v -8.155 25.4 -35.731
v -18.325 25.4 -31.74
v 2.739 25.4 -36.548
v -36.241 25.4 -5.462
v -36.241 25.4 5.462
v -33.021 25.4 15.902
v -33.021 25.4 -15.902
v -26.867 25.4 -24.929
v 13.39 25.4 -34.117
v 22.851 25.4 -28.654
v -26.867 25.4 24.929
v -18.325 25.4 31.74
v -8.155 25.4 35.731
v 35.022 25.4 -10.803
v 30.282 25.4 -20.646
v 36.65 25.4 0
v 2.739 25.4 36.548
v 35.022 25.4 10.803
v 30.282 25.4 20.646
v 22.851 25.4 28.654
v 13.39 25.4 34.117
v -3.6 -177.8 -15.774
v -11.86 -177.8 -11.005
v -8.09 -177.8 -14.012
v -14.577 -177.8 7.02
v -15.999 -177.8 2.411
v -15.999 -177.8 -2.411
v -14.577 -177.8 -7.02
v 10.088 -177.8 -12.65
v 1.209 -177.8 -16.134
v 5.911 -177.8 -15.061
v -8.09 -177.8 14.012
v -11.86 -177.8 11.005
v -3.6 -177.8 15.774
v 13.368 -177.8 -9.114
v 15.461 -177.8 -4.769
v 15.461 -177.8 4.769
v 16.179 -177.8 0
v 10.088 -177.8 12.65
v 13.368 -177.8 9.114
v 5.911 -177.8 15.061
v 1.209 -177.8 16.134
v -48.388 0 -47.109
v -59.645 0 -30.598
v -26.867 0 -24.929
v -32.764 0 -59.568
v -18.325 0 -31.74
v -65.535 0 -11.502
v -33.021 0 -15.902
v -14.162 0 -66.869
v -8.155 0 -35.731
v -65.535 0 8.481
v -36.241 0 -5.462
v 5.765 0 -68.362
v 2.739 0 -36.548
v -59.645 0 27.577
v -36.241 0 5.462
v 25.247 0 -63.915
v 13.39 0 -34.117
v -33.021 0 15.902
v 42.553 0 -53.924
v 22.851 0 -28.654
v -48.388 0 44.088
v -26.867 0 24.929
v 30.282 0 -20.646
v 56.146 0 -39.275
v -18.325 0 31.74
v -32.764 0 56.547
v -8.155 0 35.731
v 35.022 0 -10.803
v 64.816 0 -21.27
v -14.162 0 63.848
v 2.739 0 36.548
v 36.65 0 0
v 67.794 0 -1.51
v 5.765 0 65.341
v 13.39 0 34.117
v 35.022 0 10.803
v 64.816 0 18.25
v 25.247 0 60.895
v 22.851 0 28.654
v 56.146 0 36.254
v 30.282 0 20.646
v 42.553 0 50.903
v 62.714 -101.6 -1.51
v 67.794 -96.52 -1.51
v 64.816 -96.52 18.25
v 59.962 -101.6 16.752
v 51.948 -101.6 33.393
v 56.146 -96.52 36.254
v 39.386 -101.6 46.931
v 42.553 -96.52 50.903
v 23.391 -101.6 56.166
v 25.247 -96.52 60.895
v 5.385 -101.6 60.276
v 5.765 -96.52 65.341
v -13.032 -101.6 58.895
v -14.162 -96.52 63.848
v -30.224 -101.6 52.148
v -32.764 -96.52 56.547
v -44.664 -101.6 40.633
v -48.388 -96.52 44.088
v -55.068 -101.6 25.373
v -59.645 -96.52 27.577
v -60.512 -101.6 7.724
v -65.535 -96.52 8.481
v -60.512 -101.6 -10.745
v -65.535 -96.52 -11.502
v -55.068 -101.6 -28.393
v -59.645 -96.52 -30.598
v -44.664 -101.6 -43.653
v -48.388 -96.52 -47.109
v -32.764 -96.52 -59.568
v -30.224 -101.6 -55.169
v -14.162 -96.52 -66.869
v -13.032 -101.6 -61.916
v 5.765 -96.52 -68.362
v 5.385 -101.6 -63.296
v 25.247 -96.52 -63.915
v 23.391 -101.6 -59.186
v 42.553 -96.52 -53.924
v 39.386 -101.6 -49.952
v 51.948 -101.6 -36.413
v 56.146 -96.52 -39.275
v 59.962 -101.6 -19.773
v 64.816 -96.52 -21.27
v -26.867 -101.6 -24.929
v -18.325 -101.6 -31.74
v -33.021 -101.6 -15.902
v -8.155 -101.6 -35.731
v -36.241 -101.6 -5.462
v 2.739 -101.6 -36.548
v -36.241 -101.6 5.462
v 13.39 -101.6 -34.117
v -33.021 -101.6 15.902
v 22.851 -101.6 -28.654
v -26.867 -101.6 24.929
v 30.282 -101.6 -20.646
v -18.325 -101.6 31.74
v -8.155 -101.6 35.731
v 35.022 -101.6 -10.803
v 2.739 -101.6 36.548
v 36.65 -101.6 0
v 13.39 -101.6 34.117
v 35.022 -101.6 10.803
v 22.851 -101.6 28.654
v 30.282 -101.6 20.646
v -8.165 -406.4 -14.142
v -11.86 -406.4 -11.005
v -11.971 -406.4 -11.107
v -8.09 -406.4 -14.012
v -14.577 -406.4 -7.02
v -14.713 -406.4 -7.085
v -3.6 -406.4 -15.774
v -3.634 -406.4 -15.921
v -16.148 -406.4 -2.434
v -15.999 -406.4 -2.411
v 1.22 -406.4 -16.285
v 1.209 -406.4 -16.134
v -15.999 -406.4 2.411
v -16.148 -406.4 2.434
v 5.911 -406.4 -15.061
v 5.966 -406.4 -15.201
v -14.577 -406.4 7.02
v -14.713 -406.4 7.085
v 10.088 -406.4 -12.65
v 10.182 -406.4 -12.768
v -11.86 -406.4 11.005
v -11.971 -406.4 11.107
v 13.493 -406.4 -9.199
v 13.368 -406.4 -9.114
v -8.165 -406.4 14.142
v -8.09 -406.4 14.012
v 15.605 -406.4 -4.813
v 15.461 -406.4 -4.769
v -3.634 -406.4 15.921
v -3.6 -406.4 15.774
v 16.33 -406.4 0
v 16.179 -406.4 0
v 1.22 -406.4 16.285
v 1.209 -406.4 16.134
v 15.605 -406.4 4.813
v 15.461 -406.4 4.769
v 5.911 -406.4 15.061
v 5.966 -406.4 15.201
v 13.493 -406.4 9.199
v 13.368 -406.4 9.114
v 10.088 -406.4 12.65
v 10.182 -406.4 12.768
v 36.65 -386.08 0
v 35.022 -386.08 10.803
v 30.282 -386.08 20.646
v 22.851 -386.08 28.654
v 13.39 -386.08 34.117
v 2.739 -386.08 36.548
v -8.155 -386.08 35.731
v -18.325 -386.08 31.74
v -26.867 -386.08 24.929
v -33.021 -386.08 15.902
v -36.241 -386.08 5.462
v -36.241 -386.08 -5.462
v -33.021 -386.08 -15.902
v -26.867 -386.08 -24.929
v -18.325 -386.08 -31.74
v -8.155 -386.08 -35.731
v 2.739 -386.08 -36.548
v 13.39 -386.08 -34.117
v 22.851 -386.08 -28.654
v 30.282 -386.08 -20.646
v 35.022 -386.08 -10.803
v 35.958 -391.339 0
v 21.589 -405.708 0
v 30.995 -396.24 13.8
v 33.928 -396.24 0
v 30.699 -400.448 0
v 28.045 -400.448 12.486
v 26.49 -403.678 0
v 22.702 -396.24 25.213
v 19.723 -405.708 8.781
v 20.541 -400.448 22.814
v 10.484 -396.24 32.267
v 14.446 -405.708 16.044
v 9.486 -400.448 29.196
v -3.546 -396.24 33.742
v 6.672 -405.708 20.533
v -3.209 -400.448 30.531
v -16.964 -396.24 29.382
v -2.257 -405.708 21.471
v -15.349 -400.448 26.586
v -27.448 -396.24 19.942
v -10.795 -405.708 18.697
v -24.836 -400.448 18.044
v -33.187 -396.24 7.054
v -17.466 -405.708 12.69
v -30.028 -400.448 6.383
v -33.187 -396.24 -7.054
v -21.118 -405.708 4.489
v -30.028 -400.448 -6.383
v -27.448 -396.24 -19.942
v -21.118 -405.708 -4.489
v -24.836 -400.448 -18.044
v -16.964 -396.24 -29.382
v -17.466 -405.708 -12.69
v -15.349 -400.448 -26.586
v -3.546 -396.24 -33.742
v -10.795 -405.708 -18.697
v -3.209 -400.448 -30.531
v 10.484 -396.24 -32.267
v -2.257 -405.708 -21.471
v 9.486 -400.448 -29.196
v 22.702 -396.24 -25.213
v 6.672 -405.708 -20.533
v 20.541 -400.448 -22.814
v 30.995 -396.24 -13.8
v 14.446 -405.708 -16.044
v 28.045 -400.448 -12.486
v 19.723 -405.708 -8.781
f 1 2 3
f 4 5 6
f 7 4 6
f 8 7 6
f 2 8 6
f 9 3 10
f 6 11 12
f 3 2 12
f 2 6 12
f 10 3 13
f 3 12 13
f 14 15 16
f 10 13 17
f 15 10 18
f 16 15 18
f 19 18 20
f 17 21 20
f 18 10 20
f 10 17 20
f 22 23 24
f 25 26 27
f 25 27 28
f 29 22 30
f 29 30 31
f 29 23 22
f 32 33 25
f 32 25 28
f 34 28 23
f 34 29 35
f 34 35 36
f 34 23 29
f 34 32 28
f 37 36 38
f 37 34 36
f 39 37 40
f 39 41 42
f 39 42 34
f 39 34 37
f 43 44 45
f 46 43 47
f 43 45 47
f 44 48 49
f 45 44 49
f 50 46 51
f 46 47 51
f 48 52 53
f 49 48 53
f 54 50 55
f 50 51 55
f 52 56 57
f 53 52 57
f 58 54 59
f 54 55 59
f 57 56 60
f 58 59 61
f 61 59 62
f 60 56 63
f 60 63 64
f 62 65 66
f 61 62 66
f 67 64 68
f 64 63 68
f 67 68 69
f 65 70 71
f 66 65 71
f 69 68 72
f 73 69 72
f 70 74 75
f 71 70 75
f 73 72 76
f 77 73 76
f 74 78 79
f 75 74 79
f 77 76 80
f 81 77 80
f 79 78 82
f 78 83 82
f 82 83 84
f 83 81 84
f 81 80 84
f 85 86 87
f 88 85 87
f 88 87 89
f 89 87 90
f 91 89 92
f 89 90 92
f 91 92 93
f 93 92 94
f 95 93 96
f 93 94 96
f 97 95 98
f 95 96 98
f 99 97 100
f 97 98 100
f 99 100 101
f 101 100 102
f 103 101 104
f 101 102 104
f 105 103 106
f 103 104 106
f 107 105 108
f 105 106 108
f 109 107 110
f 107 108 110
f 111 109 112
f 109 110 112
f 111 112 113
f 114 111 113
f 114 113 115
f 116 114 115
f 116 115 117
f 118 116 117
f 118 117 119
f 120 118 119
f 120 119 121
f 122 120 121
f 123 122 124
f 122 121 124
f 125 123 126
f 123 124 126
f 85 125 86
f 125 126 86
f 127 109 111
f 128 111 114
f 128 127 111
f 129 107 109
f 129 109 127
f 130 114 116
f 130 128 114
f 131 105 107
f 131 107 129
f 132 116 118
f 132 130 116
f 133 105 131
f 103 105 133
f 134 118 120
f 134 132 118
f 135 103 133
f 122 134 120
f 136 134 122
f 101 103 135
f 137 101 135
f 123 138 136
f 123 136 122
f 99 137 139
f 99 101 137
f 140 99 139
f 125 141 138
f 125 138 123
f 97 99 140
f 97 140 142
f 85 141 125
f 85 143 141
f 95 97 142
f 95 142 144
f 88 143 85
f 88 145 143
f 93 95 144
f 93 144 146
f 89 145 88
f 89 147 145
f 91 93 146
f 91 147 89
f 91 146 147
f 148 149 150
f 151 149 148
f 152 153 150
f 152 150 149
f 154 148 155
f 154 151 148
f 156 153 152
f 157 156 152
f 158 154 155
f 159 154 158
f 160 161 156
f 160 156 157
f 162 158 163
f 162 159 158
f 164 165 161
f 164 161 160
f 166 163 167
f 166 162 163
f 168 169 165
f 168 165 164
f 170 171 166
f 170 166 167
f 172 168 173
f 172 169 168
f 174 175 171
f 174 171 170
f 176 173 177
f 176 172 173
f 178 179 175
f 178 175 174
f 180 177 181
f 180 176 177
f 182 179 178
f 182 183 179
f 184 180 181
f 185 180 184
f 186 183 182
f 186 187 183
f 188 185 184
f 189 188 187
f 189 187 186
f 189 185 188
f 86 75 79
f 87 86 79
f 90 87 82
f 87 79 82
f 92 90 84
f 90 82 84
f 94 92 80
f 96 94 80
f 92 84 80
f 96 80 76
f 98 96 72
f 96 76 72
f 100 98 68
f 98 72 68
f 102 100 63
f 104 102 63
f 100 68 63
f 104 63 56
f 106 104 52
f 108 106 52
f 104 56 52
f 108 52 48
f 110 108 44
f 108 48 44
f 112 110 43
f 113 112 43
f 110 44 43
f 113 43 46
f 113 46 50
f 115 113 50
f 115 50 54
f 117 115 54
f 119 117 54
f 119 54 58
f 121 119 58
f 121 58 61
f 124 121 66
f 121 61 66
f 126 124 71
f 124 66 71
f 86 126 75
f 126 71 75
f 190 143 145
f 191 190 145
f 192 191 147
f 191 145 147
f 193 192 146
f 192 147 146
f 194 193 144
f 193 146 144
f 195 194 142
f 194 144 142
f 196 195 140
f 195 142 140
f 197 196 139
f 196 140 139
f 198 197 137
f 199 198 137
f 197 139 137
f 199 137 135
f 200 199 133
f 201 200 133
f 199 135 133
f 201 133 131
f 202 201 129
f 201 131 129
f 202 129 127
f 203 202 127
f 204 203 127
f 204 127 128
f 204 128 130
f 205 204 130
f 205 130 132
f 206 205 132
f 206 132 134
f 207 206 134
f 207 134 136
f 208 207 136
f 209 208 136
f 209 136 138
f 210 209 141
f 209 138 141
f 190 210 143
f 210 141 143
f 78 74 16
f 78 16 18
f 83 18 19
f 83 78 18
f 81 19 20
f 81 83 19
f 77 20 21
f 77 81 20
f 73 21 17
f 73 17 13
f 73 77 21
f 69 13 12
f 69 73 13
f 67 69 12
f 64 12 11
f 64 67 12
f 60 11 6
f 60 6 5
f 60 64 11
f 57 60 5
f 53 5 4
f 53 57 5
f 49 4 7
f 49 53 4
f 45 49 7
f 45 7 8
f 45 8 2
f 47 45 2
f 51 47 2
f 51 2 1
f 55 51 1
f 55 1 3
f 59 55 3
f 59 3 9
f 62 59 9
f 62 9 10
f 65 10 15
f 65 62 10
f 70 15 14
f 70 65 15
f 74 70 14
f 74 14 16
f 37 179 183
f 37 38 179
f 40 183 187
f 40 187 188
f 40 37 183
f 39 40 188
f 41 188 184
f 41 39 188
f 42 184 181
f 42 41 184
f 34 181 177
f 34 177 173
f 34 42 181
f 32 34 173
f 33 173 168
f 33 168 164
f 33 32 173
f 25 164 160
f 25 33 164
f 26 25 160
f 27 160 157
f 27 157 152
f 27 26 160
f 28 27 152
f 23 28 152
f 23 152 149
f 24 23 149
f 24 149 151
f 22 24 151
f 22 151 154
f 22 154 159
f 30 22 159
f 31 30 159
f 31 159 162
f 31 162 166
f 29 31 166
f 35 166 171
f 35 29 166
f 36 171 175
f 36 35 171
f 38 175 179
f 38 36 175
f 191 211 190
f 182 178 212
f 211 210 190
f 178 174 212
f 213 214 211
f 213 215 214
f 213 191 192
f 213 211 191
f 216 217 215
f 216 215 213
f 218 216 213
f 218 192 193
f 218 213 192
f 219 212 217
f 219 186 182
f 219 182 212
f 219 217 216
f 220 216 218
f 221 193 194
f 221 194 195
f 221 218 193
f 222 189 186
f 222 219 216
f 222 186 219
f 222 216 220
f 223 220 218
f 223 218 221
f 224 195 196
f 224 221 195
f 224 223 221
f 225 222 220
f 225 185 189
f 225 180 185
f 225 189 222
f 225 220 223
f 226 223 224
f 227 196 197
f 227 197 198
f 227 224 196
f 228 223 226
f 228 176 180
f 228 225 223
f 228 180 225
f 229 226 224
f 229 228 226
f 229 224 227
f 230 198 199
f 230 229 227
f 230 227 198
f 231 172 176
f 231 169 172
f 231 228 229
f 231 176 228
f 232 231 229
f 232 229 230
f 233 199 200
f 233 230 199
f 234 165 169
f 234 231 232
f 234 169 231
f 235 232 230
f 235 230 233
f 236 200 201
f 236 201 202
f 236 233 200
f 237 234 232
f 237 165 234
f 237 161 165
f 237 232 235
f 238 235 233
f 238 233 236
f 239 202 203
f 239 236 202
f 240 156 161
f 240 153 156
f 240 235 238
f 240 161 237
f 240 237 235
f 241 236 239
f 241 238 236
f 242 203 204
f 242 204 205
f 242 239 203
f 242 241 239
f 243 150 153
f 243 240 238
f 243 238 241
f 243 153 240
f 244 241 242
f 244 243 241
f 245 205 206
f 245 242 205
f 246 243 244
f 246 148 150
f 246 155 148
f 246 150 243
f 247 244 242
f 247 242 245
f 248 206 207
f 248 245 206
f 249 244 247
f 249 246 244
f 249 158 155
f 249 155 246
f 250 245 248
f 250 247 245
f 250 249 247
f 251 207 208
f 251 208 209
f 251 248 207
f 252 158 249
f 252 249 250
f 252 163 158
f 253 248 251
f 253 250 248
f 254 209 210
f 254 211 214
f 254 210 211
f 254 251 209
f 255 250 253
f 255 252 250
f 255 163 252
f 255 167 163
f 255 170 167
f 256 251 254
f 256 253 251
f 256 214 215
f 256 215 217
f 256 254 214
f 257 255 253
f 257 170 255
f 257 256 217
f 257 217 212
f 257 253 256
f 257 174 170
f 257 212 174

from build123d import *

# Parameters (mm, degrees)
F0_R        = 36.650285017
F1_DEPTH    = 50.8
F2_R        = 16.1794098337
F3_DEPTH    = 127
F5_R        = 28.203657399
F5_R_2      = 16.1794098337
F4_R        = 16.1794098337
F3_FACE_R   = 16.1794098337
F6_DEPTH    = 50.8
F7_DEPTH    = 101.6
F8_DEPTH    = 50.8
F9_DEPTH    = 101.6
F10_DEPTH   = 25.4
F11_R       = 67.0391911282
F9_FACE_R   = 36.650285017
F9_FACE_R_2 = 16.1794098337
F12_DEPTH   = 101.6
F13_R       = 20.32
F14_SIZE    = 5.08


with BuildPart() as f1:
    # F0 (on Front) → F1 (new body)
    with BuildSketch(Plane.XZ):
        Circle(F0_R)
    extrude(amount=F1_DEPTH)

    # F2 (on face) → F3 (join)
    with BuildSketch(Plane.XZ.offset(50.8)):
        Circle(F2_R)
    extrude(amount=F3_DEPTH)

    # F5 (on face) + F4 (on face) + F3_face (on face) → F6 (cut)
    with BuildSketch(Plane.XZ.offset(177.8)):
        Circle(F5_R)
        Circle(F5_R_2, mode=Mode.SUBTRACT)
        Circle(F5_R_2)
    with BuildSketch(Plane.XZ.offset(177.8)):
        Circle(F4_R)
    with BuildSketch(Plane.XZ.offset(177.8)):
        Circle(F3_FACE_R)
    extrude(amount=-F6_DEPTH, mode=Mode.SUBTRACT)

    # F7 (add): faces of the model
    f7_faces = [f1.faces().sort_by_distance(p)[0] for p in [
        (-35.6136584143, -50.8, 0),
        (0, 0, 0),
    ]]
    extrude(f7_faces, amount=F7_DEPTH, dir=(0, -1, 0))

    # F8 (add): faces of the model
    f8_faces = [f1.faces().sort_by_distance(p)[0] for p in [
        (-35.6136584143, -152.4, 0),
        (0, -127, 0),
        (0, 0, 0),
    ]]
    extrude(f8_faces, amount=F8_DEPTH, dir=(0, -1, 0))

    # F9 (add): faces of the model
    f9_faces = [f1.faces().sort_by_distance(p)[0] for p in [
        (-35.6136584143, -203.2, 0),
        (0, 0, 0),
    ]]
    extrude(f9_faces, amount=F9_DEPTH, dir=(0, -1, 0))

    # F10 (add): faces of the model
    f10_faces = [f1.faces().sort_by_distance(p)[0] for p in [
        (0, -177.8, 0),
        (0, 0, 0),
    ]]
    extrude(f10_faces, amount=-F10_DEPTH, dir=(0, -1, 0))

    # F11 (on Front) + F9_face (on face) → F12 (join)
    with BuildSketch(Plane.XZ):
        with Locations((0.7551472518, -1.5102935722)):
            Circle(F11_R)
    with BuildSketch(Plane.XZ.offset(304.8)):
        Circle(F9_FACE_R)
        Circle(F9_FACE_R_2, mode=Mode.SUBTRACT)
    extrude(amount=F12_DEPTH)

    # F13
    f13_edges = [f1.edges().sort_by_distance(p)[0] for p in [
        (-36.650285, -406.4, 0),
    ]]
    fillet(f13_edges, radius=F13_R)

    # F14
    f14_edges = [f1.edges().sort_by_distance(p)[0] for p in [
        (-66.284044, -101.6, -1.510294),
    ]]
    chamfer(f14_edges, length=F14_SIZE)


solid = f1.part
